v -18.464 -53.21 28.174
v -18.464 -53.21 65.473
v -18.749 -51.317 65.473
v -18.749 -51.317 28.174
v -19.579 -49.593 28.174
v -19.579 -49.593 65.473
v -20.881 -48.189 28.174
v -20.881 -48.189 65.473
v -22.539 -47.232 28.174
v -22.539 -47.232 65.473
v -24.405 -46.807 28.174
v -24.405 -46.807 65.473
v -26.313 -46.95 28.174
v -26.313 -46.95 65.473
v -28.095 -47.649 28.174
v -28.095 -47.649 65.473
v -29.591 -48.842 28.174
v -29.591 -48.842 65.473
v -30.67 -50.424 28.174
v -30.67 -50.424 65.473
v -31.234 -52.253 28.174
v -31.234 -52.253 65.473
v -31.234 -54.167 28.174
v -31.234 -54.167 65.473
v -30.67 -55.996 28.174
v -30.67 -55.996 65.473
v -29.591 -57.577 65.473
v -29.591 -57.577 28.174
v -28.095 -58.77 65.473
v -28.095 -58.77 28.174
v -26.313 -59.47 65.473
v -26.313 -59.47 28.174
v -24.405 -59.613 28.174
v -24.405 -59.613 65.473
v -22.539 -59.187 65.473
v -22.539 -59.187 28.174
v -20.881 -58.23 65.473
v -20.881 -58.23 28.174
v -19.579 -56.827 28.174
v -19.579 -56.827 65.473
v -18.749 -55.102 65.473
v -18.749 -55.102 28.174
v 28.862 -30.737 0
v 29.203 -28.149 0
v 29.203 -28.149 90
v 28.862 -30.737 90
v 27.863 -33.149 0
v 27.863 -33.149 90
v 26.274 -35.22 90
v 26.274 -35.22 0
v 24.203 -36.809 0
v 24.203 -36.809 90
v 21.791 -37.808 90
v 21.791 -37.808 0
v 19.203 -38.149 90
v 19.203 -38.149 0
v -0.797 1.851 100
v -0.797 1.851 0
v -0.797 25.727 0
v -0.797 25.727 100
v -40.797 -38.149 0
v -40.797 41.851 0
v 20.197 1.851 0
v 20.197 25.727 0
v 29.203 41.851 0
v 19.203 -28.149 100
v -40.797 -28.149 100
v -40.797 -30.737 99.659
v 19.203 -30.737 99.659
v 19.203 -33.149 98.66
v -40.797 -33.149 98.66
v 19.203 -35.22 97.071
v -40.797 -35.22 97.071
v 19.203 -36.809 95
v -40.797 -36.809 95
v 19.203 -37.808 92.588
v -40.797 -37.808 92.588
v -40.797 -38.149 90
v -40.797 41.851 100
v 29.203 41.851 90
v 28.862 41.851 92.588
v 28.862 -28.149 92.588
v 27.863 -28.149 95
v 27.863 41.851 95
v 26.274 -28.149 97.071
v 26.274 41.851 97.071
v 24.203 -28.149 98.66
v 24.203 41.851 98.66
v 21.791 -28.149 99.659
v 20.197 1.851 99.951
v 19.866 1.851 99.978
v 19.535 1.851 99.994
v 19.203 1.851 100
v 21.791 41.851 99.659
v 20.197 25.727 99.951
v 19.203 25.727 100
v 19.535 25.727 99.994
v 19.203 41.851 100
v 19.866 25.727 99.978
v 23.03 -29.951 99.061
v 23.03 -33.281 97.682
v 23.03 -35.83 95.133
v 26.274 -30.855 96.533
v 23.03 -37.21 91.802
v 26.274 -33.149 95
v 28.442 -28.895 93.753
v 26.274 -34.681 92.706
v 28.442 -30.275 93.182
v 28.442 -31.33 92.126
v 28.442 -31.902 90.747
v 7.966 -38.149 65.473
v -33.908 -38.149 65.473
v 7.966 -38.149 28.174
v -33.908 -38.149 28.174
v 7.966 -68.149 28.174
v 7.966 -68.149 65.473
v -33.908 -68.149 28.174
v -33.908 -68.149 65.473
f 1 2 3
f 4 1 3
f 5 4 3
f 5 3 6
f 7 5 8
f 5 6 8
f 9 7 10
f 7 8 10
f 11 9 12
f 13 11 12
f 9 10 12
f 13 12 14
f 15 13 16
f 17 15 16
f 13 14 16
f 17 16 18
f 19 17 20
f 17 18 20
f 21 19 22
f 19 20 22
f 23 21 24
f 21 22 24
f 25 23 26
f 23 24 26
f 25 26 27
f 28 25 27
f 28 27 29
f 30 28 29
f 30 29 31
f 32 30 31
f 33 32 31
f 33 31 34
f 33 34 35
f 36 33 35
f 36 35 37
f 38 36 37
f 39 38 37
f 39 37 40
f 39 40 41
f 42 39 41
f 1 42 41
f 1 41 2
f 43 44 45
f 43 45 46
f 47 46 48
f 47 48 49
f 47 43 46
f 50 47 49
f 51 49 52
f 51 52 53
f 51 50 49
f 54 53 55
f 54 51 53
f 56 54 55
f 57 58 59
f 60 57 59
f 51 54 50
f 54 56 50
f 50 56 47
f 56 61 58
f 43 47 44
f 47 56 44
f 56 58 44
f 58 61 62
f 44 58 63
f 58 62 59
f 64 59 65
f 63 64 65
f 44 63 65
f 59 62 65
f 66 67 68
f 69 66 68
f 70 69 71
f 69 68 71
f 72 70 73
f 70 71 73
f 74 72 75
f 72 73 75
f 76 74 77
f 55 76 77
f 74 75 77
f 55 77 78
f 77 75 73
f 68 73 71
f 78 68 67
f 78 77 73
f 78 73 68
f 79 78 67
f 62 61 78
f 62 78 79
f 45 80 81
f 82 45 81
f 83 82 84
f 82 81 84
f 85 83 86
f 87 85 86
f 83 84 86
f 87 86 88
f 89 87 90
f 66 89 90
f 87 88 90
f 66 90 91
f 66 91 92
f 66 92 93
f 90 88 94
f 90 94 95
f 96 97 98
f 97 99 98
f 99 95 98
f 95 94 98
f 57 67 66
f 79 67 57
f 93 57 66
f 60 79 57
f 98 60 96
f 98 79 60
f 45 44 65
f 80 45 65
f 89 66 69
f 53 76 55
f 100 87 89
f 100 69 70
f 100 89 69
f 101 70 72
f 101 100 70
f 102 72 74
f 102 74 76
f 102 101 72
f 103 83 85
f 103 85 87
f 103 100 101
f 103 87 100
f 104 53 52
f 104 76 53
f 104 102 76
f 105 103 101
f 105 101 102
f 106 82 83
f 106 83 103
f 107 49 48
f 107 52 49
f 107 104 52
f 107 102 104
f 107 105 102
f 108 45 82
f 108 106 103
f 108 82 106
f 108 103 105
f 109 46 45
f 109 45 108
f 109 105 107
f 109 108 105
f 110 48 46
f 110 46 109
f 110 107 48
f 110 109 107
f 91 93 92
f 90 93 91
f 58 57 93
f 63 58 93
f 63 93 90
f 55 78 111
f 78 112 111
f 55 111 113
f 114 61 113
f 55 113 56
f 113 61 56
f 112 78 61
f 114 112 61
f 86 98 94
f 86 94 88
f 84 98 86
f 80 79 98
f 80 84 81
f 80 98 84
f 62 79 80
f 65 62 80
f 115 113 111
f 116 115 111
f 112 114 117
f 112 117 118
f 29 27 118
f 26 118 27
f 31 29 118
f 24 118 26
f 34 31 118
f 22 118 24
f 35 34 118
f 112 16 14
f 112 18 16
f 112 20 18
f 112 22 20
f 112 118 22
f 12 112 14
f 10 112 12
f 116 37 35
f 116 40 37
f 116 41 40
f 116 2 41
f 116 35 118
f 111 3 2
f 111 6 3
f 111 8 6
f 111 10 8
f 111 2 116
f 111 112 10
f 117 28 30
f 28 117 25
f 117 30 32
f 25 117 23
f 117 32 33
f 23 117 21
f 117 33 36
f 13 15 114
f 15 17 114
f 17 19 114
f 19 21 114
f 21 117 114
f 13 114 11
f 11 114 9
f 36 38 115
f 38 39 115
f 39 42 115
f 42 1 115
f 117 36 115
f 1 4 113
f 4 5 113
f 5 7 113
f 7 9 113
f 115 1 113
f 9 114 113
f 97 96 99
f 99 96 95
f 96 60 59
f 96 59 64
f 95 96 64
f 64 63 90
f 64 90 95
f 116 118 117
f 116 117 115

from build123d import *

# Parameters (mm, degrees)
F0_W         = 70
F0_H         = 80
F0_W_2       = 20.9936025798
F0_H_2       = 23.8757147082
F1_DEPTH     = 100
F2_W         = 41.873505339
F2_H         = 37.2992325574
F3_DEPTH     = 30
F4_R         = 6.4210037994
F5_DEPTH     = 50
F6_T1_DEPTH  = 85
F6_T3_DEPTH  = 95
F6_T5_DEPTH  = 115
F6_S9_W      = 10
F6_S9_H      = 10
F6_T10_DEPTH = 10


# Not quite as in the source:
# - a fillet or chamfer that OpenCascade refuses, or shapes differently, is made with other operations: its cross-section is extruded or revolved along the edge and cut away or added


with BuildPart() as f1:
    # F0 (on Top) → F1 (new body)
    with BuildSketch(Plane.XY):
        with Locations((-5.7970939631, 1.8514618278)):
            Rectangle(F0_W, F0_H)
        with Locations((9.6997073268, 13.7893191818)):
            Rectangle(F0_W_2, F0_H_2, mode=Mode.SUBTRACT)
    extrude(amount=F1_DEPTH)

    # F2 (on face) → F3 (join)
    with BuildSketch(Plane.XZ.offset(38.1485381722)):
        with Locations((-12.9710743204, 46.823351644)):
            Rectangle(F2_W, F2_H)
    extrude(amount=F3_DEPTH)

    # F4 (on face) → F5 (cut)
    with BuildSketch(Plane.XY.offset(65.4729679227)):
        with Locations((-24.8845424503, -53.2096363604)):
            Circle(F4_R)
    extrude(amount=-F5_DEPTH, mode=Mode.SUBTRACT)

    # F6: fillet of radius 10 on 3 edges, made by hand

    # F6_s2 → F6_t1 (cut)
    with BuildSketch(Plane.YZ.offset(-65.7970939631)):
        with BuildLine():
            ThreePointArc((-28.1485381722, 100), (-35.2196059841, 97.0710678119), (-38.1485381722, 90))
            Line((-38.1485381722, 90), (-38.1485381722, 100))
            Line((-38.1485381722, 100), (-28.1485381722, 100))
        make_face()
    extrude(amount=F6_T1_DEPTH, mode=Mode.SUBTRACT)

    # F6_s4 → F6_t3 (cut)
    with BuildSketch(Plane.XZ.offset(-66.8514618278)):
        with BuildLine():
            ThreePointArc((29.2029060369, 90), (26.2739738488, 97.0710678119), (19.2029060369, 100))
            Line((19.2029060369, 100), (29.2029060369, 100))
            Line((29.2029060369, 100), (29.2029060369, 90))
        make_face()
    extrude(amount=F6_T3_DEPTH, mode=Mode.SUBTRACT)

    # F6_s6 → F6_t5 (cut)
    with BuildSketch(Plane.XY.offset(-25)):
        with BuildLine():
            ThreePointArc((29.2029060369, -28.1485381722), (26.2739738488, -35.2196059841), (19.2029060369, -38.1485381722))
            Line((19.2029060369, -38.1485381722), (29.2029060369, -38.1485381722))
            Line((29.2029060369, -38.1485381722), (29.2029060369, -28.1485381722))
        make_face()
    extrude(amount=F6_T5_DEPTH, mode=Mode.SUBTRACT)


with BuildPart() as f6_tool8:
    # F6_s9 → F6_t10 (new body)
    with BuildSketch(Plane.YZ.offset(19.2029060369)):
        with Locations((-33.1485381722, 95)):
            Rectangle(F6_S9_W, F6_S9_H)
    extrude(amount=F6_T10_DEPTH)

    # F6_s11 → F6_t12 (revolve, cut)
    with BuildSketch(Plane(origin=(19.2029060369, -28.1485381722, 90), x_dir=(0, 0.7071067812, -0.7071067812), z_dir=(0, -0.7071067812, -0.7071067812))):
        with BuildLine():
            ThreePointArc((0, -10), (10, 0), (0, 10))
            Line((0, 10), (0, -10))
        make_face()
    revolve(axis=Axis((19.2029060369, -28.1485381722, 90), (1, 0, 0)), mode=Mode.SUBTRACT)


with BuildPart() as f1_1:
    add(f1.part)

    # F6_t7: cut F6_tool8
    add(f6_tool8.part, mode=Mode.SUBTRACT)


solid = f1_1.part
